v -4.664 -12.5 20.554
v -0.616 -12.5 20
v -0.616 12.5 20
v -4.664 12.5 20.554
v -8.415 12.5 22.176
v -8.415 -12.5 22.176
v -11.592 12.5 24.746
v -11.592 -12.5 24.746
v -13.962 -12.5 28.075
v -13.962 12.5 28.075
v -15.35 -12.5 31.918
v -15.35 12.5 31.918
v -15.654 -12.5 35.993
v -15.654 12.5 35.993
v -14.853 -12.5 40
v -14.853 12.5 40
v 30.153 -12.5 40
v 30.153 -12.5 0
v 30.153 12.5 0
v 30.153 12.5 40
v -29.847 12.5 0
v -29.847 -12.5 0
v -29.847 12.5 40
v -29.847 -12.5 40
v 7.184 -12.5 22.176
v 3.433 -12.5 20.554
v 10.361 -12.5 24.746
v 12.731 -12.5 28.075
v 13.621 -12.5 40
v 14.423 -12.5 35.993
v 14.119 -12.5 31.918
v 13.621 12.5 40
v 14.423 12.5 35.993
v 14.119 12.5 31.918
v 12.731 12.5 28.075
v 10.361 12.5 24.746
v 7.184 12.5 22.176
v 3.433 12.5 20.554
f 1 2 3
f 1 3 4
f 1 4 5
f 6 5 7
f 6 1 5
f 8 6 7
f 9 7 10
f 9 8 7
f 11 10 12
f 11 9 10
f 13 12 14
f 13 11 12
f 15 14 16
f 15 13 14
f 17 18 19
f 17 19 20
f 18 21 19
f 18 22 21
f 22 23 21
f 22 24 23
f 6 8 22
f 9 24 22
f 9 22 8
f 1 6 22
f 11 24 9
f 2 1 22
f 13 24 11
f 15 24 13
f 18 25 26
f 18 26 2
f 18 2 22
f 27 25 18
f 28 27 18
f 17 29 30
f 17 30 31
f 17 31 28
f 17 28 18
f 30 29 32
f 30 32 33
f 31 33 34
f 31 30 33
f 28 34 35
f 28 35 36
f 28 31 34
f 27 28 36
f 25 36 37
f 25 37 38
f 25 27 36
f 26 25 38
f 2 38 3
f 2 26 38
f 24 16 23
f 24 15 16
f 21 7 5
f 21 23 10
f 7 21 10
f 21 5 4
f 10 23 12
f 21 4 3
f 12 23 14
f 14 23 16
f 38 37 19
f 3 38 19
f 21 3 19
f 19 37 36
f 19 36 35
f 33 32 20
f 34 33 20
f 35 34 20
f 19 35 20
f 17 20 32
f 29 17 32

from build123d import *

# Parameters (mm, degrees)
F0_W     = 20
F0_H     = 20
F1_DEPTH = 12.5


with BuildPart() as f1:
    # F0 (on Front) → F1 (new body, symmetric)
    with BuildSketch(Plane.XZ):
        with Locations((-19.847408, 10)):
            Rectangle(F0_W, F0_H)
        Polygon((-9.847408, 20), (-9.847408, 0), (10.152592, 0), (10.152592, 20), (-0.615767, 20), align=None)
        with BuildLine():
            Line((-29.847408, 40), (-29.847408, 20))
            Line((-29.847408, 20), (-9.847408, 20))
            Line((-9.847408, 20), (-0.615767, 20))
            ThreePointArc((-0.615767, 20), (-12.890606, 26.329441), (-14.852573, 40))
            Line((-14.852573, 40), (-29.847408, 40))
        make_face()
        with Locations((20.152592, 10)):
            Rectangle(F0_W, F0_H)
        with BuildLine():
            Line((-0.615767, 20), (10.152592, 20))
            Line((10.152592, 20), (30.152592, 20))
            Line((30.152592, 20), (30.152592, 40))
            Line((30.152592, 40), (13.621039, 40))
            ThreePointArc((13.621039, 40), (11.659072, 26.329441), (-0.615767, 20))
        make_face()
    extrude(amount=F1_DEPTH, both=True)


solid = f1.part
